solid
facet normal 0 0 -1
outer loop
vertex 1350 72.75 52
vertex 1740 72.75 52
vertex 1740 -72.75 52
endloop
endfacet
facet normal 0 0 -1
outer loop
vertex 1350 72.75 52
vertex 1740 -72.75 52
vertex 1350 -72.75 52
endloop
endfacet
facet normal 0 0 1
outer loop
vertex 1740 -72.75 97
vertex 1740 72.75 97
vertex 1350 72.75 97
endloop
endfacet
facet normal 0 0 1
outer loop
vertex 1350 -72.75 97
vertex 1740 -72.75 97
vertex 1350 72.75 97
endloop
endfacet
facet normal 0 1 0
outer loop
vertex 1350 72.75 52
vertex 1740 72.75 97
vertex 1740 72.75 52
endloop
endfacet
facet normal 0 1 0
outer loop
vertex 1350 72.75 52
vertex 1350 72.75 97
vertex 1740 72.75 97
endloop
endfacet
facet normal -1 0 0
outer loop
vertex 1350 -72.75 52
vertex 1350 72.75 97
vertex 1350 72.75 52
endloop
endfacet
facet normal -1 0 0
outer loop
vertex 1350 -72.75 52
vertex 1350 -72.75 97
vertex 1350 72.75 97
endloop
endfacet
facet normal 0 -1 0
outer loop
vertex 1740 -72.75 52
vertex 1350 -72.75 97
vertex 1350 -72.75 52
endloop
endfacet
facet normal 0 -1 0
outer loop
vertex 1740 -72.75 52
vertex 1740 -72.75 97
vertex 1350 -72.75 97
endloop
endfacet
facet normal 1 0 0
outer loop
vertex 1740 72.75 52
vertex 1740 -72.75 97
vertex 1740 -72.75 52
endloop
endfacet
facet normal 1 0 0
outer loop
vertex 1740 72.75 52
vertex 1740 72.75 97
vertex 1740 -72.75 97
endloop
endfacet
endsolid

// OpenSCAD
translate([0.0, 0.0, 52.0])
{
    translate([1545.0, 0.0, 0.0])
    {
        linear_extrude(height = 45.0, twist = 0.0, scale = 1.0, slices = 1, center = false)
        {
            scale([390.0, 145.5])
            {
                M52();
            }
        }
    }
}

module M52()
{
    polygon
    (
        points =
        [
            [-0.5, -0.5], 
            [0.5, -0.5], 
            [0.5, 0.5], 
            [-0.5, 0.5]
        ],
        paths =
        [
            [0, 1, 2, 3]
        ]
    );
}
